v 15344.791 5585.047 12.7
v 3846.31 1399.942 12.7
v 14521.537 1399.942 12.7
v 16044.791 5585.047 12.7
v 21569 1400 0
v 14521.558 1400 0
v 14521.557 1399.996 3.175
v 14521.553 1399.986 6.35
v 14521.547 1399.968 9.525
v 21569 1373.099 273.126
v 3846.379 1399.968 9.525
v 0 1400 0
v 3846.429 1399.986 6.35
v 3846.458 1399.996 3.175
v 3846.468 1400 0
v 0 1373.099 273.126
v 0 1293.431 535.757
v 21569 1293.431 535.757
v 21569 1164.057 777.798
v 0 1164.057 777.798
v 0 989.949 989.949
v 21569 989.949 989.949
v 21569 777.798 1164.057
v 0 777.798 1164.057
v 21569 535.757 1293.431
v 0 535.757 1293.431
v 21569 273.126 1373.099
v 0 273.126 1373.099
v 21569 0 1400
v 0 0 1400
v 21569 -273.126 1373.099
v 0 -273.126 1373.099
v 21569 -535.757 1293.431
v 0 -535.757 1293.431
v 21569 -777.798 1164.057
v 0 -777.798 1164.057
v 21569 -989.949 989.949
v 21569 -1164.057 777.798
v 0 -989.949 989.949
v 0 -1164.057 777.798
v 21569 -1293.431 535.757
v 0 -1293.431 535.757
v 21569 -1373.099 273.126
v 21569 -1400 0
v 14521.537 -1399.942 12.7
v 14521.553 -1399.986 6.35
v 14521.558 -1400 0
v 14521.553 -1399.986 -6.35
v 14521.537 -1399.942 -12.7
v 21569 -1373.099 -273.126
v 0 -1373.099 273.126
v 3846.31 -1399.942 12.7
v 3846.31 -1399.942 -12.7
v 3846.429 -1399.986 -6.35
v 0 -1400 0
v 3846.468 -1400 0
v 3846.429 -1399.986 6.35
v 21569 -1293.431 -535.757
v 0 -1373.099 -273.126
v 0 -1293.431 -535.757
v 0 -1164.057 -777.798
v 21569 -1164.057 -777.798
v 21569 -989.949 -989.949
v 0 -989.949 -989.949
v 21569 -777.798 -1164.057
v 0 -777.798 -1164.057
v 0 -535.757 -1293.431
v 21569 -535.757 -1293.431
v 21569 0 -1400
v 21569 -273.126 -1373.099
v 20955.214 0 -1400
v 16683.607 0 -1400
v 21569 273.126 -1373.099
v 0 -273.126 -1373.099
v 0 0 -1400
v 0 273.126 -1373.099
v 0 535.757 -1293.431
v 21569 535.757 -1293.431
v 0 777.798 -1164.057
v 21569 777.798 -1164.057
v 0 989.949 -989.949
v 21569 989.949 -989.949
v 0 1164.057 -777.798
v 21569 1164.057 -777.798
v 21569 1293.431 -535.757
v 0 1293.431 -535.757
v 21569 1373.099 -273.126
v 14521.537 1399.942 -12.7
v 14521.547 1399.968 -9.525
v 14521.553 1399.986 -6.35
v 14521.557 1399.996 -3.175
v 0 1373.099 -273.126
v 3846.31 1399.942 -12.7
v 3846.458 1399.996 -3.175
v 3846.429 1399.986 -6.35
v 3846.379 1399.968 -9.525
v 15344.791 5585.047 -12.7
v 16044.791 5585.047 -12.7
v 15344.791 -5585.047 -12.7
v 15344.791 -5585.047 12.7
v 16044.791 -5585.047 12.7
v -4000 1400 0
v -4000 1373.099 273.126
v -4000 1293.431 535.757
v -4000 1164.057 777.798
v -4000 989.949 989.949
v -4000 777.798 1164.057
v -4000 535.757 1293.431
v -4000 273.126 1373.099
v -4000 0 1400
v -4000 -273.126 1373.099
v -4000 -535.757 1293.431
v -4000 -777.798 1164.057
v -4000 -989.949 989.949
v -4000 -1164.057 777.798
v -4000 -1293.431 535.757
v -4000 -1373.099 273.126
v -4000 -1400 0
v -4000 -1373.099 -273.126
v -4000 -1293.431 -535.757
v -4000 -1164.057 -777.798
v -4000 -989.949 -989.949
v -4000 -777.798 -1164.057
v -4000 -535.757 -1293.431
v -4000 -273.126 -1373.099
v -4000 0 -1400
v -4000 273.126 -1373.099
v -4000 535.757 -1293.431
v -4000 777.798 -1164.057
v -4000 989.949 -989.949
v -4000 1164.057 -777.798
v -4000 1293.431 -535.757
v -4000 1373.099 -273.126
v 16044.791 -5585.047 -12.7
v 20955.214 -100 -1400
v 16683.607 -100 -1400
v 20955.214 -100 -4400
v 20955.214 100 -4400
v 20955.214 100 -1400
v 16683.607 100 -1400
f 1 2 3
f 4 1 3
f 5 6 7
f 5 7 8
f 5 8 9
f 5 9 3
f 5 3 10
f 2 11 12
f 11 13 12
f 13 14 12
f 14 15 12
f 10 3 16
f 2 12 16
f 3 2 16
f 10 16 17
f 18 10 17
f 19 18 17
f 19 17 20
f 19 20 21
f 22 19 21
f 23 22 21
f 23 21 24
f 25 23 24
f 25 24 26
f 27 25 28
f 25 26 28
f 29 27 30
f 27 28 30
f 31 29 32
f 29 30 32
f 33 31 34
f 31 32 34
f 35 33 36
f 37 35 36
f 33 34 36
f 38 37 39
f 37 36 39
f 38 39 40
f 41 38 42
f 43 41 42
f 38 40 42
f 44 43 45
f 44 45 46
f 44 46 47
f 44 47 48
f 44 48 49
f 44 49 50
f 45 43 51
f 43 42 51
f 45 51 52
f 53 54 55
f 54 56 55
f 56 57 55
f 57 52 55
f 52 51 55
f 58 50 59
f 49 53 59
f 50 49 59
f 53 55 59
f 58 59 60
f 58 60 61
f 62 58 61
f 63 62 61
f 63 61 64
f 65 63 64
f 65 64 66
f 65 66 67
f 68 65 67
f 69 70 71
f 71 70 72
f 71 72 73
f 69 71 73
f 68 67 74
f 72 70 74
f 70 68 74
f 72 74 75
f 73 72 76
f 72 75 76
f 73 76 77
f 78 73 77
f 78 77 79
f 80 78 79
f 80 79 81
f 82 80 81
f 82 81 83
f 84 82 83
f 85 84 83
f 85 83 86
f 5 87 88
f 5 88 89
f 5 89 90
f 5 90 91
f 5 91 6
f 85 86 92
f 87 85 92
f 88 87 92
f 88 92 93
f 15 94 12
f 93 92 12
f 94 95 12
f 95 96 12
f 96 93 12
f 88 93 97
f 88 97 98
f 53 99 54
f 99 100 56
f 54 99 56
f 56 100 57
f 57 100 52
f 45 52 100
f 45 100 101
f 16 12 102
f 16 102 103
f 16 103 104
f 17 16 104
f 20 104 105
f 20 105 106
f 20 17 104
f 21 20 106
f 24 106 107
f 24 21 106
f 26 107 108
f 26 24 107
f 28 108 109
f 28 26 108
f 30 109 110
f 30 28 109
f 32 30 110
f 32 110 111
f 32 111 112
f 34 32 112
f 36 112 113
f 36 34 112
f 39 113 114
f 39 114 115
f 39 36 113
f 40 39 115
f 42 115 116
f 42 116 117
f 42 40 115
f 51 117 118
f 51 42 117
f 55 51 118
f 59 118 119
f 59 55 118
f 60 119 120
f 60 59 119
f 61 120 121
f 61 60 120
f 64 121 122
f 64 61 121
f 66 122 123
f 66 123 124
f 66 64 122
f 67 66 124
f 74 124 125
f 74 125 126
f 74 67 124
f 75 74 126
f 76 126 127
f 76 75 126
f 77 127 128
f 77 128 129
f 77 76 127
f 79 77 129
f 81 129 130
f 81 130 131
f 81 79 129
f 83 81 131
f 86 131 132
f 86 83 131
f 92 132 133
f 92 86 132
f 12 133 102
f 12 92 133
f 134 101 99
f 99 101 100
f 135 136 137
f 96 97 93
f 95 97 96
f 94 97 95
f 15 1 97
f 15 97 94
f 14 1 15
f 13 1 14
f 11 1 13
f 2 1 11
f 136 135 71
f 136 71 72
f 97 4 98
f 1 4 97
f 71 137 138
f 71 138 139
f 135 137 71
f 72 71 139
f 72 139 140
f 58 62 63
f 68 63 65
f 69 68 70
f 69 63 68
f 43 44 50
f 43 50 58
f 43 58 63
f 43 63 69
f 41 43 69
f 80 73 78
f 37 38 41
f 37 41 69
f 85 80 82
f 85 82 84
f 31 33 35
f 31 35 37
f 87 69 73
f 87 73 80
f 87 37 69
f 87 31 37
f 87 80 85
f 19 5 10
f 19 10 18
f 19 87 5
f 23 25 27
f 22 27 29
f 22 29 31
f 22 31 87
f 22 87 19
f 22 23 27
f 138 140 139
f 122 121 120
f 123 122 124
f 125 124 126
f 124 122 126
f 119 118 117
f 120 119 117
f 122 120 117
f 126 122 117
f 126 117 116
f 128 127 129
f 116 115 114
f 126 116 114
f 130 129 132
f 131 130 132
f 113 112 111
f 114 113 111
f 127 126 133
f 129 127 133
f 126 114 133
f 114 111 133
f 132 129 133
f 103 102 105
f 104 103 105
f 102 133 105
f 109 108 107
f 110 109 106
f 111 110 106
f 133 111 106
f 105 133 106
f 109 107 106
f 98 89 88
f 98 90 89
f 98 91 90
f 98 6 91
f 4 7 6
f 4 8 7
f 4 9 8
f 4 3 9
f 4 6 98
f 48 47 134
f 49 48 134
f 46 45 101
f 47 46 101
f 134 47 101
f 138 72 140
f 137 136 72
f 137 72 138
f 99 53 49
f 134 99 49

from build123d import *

# Parameters (mm, degrees)
F1_DEPTH = 12.7
F3_R     = 1400
F4_DEPTH = 21569
F5_DEPTH = 4000
F9_DEPTH = 100


# Not quite as in the source:
# - the program builds the solid bodies; features that only make, move or delete a surface that nothing else refers to are left out


with BuildPart() as f1:
    # F0 (on Top) → F1 (new body, symmetric)
    with BuildSketch(Plane.XY):
        Polygon((15344.7909177956, 5585.047145116), (0, 0), (14012, 0), (16044.7909177956, 5585.047145116), align=None)
    extrude(amount=F1_DEPTH, both=True)

    # F2: F1 across plane


with BuildPart() as f1_1:
    add(f1.part)
    add(f1.part.mirror(Plane.XZ))

    # F3 (on Right) → F4 (join)
    with BuildSketch(Plane.YZ):
        Circle(F3_R)
    extrude(amount=F4_DEPTH)

    # F3 (on Right) → F5 (join)
    with BuildSketch(Plane.YZ):
        Circle(F3_R)
    extrude(amount=-F5_DEPTH)

    # F8 (on Front) → F9 (join, symmetric)
    with BuildSketch(Plane.XZ):
        Polygon((16683.6071014404, -1400), (20955.2135467529, -4400), (20955.2135467529, -1400), align=None)
    extrude(amount=F9_DEPTH, both=True)


solid = f1_1.part
